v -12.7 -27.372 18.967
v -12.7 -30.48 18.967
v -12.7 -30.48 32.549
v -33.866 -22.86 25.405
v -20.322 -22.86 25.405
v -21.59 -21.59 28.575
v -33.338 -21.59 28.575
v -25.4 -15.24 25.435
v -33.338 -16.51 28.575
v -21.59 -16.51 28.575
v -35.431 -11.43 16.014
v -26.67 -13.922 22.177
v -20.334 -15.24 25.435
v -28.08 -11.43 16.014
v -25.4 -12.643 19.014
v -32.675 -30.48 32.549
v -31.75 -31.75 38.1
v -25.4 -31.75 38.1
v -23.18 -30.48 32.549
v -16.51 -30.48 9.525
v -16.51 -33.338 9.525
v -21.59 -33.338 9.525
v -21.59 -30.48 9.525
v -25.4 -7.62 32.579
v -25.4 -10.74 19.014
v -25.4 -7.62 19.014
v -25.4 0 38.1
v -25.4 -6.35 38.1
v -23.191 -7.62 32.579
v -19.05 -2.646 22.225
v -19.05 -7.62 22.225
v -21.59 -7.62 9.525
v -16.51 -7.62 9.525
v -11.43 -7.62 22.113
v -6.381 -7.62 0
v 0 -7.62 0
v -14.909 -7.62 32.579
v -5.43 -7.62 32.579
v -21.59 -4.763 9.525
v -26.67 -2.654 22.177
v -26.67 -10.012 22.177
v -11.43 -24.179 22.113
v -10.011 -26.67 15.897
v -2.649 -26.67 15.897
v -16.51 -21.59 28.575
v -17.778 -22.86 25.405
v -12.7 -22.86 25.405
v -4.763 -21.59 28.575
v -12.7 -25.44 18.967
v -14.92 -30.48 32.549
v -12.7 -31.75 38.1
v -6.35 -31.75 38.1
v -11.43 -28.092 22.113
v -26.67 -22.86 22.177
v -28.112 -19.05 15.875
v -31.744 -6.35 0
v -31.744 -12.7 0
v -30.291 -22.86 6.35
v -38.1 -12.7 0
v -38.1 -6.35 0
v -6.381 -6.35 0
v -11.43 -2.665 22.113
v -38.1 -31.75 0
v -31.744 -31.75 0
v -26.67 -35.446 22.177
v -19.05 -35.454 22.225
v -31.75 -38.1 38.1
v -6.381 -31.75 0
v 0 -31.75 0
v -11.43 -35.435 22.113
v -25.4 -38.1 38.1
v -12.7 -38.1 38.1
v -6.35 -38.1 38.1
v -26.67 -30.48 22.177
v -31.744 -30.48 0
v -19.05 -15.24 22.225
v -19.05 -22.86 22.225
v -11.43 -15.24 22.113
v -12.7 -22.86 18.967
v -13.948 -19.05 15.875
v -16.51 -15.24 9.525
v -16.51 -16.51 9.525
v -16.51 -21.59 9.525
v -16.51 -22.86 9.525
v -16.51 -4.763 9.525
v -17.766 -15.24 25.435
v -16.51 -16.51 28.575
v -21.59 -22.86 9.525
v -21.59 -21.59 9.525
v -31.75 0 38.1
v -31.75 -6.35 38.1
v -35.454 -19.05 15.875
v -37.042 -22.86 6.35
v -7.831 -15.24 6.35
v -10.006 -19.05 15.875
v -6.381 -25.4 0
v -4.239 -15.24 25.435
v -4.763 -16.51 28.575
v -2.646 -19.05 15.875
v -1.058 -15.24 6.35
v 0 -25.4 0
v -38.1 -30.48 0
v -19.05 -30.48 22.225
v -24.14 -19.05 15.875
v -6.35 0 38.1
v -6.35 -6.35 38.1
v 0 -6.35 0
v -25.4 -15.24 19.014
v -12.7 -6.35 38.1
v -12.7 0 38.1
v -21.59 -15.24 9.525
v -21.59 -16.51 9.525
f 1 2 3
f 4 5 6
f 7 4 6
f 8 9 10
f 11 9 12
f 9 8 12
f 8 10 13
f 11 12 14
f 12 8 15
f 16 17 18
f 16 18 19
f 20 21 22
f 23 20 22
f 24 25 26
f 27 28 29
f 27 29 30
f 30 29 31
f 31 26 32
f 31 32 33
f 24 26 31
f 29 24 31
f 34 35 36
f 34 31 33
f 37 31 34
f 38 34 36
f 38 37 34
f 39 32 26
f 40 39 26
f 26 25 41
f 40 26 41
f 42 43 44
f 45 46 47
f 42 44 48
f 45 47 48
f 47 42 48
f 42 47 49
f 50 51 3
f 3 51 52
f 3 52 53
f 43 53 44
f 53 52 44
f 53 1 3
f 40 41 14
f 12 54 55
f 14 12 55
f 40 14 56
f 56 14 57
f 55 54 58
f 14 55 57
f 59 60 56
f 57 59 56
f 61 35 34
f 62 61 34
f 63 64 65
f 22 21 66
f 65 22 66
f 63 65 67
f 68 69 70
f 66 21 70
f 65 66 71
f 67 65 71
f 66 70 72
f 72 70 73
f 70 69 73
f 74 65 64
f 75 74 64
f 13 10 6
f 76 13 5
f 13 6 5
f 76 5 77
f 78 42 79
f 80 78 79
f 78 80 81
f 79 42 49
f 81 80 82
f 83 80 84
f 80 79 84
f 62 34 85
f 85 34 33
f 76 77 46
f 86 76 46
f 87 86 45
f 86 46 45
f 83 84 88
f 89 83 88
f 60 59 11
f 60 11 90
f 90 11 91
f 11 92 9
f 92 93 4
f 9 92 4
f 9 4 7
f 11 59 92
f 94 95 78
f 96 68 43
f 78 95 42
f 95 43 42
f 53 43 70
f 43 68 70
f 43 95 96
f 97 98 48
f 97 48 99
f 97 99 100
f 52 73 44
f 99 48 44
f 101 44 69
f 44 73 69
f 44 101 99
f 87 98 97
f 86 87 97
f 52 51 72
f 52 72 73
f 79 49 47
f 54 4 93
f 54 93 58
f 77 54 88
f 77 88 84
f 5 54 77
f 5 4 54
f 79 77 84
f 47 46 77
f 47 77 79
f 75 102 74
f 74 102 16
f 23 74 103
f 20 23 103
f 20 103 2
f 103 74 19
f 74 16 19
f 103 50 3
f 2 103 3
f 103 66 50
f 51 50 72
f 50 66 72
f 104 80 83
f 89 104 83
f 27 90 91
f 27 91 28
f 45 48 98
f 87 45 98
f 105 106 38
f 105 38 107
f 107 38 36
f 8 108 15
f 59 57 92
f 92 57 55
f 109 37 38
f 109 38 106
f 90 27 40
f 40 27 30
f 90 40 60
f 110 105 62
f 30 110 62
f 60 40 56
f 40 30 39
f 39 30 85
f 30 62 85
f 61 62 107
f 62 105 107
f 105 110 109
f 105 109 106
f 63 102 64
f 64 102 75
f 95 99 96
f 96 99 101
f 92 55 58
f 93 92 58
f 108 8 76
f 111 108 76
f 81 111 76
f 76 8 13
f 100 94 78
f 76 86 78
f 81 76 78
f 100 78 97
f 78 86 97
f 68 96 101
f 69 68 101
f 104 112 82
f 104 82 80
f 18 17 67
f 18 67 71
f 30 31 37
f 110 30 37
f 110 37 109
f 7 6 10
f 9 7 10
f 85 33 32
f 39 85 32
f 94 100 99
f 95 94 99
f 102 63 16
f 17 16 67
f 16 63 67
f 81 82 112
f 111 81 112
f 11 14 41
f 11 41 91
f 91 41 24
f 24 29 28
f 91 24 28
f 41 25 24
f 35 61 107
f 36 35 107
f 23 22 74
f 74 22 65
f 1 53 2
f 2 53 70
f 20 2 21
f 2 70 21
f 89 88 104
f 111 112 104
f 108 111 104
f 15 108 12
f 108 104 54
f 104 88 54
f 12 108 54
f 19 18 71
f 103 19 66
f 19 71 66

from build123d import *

# Parameters (mm, degrees)
F0_W      = 38.1
F0_H      = 38.1
F1_DEPTH  = 38.1
F6_DEPTH  = 76.2
F8_DEPTH  = 38.1
F9_W      = 25.4
F9_H      = 7.62
F10_DEPTH = 38.1


with BuildPart() as f1:
    # F0 (on Front) → F1 (new body)
    with BuildSketch(Plane.XZ):
        with Locations((-19.05, 19.05)):
            Rectangle(F0_W, F0_H)
    extrude(amount=F1_DEPTH)

    # F5 (on offset) → F6 (cut)
    with BuildSketch(Plane.YZ.offset(38.1)):
        Polygon((-31.75, 0), (-38.1, 38.1), (-38.1, 0), align=None)
        Polygon((-11.43, 16.014082), (-6.35, 38.1), (-31.75, 38.1), (-26.67, 15.896983), (-21.59, 28.575), (-16.51, 28.575), align=None)
        Polygon((-25.4, 0), (-12.7, 0), (-19.05, 15.875), align=None)
        Polygon((-6.35, 0), (0, 0), (0, 38.1), align=None)
    extrude(amount=-F6_DEPTH, mode=Mode.SUBTRACT)

    # F7 (on offset) → F8 (cut)
    with BuildSketch(Plane.XZ.offset(38.1)):
        Polygon((-31.75, 38.1), (-38.1, 38.1), (-38.1, 0), align=None)
        Polygon((-12.7, 38.1), (-25.4, 38.1), (-19.05, 22.225), align=None)
        Polygon((0, 38.1), (-6.35, 38.1), (0, 0), align=None)
        Polygon((-26.67, 22.177041), (-31.75, -0.026754), (-6.350338, -0.133766), (-11.430338, 22.112834), (-16.510338, 9.525), (-21.590338, 9.525), align=None)
    extrude(amount=-F8_DEPTH, mode=Mode.SUBTRACT)

    # F9 (on offset) → F10 (cut)
    with BuildSketch(Plane.XY.offset(38.1)):
        with Locations((-12.7, -11.43)):
            Rectangle(F9_W, F9_H)
        with Locations((-25.4, -26.67)):
            Rectangle(F9_W, F9_H)
    extrude(amount=-F10_DEPTH, mode=Mode.SUBTRACT)


solid = f1.part
